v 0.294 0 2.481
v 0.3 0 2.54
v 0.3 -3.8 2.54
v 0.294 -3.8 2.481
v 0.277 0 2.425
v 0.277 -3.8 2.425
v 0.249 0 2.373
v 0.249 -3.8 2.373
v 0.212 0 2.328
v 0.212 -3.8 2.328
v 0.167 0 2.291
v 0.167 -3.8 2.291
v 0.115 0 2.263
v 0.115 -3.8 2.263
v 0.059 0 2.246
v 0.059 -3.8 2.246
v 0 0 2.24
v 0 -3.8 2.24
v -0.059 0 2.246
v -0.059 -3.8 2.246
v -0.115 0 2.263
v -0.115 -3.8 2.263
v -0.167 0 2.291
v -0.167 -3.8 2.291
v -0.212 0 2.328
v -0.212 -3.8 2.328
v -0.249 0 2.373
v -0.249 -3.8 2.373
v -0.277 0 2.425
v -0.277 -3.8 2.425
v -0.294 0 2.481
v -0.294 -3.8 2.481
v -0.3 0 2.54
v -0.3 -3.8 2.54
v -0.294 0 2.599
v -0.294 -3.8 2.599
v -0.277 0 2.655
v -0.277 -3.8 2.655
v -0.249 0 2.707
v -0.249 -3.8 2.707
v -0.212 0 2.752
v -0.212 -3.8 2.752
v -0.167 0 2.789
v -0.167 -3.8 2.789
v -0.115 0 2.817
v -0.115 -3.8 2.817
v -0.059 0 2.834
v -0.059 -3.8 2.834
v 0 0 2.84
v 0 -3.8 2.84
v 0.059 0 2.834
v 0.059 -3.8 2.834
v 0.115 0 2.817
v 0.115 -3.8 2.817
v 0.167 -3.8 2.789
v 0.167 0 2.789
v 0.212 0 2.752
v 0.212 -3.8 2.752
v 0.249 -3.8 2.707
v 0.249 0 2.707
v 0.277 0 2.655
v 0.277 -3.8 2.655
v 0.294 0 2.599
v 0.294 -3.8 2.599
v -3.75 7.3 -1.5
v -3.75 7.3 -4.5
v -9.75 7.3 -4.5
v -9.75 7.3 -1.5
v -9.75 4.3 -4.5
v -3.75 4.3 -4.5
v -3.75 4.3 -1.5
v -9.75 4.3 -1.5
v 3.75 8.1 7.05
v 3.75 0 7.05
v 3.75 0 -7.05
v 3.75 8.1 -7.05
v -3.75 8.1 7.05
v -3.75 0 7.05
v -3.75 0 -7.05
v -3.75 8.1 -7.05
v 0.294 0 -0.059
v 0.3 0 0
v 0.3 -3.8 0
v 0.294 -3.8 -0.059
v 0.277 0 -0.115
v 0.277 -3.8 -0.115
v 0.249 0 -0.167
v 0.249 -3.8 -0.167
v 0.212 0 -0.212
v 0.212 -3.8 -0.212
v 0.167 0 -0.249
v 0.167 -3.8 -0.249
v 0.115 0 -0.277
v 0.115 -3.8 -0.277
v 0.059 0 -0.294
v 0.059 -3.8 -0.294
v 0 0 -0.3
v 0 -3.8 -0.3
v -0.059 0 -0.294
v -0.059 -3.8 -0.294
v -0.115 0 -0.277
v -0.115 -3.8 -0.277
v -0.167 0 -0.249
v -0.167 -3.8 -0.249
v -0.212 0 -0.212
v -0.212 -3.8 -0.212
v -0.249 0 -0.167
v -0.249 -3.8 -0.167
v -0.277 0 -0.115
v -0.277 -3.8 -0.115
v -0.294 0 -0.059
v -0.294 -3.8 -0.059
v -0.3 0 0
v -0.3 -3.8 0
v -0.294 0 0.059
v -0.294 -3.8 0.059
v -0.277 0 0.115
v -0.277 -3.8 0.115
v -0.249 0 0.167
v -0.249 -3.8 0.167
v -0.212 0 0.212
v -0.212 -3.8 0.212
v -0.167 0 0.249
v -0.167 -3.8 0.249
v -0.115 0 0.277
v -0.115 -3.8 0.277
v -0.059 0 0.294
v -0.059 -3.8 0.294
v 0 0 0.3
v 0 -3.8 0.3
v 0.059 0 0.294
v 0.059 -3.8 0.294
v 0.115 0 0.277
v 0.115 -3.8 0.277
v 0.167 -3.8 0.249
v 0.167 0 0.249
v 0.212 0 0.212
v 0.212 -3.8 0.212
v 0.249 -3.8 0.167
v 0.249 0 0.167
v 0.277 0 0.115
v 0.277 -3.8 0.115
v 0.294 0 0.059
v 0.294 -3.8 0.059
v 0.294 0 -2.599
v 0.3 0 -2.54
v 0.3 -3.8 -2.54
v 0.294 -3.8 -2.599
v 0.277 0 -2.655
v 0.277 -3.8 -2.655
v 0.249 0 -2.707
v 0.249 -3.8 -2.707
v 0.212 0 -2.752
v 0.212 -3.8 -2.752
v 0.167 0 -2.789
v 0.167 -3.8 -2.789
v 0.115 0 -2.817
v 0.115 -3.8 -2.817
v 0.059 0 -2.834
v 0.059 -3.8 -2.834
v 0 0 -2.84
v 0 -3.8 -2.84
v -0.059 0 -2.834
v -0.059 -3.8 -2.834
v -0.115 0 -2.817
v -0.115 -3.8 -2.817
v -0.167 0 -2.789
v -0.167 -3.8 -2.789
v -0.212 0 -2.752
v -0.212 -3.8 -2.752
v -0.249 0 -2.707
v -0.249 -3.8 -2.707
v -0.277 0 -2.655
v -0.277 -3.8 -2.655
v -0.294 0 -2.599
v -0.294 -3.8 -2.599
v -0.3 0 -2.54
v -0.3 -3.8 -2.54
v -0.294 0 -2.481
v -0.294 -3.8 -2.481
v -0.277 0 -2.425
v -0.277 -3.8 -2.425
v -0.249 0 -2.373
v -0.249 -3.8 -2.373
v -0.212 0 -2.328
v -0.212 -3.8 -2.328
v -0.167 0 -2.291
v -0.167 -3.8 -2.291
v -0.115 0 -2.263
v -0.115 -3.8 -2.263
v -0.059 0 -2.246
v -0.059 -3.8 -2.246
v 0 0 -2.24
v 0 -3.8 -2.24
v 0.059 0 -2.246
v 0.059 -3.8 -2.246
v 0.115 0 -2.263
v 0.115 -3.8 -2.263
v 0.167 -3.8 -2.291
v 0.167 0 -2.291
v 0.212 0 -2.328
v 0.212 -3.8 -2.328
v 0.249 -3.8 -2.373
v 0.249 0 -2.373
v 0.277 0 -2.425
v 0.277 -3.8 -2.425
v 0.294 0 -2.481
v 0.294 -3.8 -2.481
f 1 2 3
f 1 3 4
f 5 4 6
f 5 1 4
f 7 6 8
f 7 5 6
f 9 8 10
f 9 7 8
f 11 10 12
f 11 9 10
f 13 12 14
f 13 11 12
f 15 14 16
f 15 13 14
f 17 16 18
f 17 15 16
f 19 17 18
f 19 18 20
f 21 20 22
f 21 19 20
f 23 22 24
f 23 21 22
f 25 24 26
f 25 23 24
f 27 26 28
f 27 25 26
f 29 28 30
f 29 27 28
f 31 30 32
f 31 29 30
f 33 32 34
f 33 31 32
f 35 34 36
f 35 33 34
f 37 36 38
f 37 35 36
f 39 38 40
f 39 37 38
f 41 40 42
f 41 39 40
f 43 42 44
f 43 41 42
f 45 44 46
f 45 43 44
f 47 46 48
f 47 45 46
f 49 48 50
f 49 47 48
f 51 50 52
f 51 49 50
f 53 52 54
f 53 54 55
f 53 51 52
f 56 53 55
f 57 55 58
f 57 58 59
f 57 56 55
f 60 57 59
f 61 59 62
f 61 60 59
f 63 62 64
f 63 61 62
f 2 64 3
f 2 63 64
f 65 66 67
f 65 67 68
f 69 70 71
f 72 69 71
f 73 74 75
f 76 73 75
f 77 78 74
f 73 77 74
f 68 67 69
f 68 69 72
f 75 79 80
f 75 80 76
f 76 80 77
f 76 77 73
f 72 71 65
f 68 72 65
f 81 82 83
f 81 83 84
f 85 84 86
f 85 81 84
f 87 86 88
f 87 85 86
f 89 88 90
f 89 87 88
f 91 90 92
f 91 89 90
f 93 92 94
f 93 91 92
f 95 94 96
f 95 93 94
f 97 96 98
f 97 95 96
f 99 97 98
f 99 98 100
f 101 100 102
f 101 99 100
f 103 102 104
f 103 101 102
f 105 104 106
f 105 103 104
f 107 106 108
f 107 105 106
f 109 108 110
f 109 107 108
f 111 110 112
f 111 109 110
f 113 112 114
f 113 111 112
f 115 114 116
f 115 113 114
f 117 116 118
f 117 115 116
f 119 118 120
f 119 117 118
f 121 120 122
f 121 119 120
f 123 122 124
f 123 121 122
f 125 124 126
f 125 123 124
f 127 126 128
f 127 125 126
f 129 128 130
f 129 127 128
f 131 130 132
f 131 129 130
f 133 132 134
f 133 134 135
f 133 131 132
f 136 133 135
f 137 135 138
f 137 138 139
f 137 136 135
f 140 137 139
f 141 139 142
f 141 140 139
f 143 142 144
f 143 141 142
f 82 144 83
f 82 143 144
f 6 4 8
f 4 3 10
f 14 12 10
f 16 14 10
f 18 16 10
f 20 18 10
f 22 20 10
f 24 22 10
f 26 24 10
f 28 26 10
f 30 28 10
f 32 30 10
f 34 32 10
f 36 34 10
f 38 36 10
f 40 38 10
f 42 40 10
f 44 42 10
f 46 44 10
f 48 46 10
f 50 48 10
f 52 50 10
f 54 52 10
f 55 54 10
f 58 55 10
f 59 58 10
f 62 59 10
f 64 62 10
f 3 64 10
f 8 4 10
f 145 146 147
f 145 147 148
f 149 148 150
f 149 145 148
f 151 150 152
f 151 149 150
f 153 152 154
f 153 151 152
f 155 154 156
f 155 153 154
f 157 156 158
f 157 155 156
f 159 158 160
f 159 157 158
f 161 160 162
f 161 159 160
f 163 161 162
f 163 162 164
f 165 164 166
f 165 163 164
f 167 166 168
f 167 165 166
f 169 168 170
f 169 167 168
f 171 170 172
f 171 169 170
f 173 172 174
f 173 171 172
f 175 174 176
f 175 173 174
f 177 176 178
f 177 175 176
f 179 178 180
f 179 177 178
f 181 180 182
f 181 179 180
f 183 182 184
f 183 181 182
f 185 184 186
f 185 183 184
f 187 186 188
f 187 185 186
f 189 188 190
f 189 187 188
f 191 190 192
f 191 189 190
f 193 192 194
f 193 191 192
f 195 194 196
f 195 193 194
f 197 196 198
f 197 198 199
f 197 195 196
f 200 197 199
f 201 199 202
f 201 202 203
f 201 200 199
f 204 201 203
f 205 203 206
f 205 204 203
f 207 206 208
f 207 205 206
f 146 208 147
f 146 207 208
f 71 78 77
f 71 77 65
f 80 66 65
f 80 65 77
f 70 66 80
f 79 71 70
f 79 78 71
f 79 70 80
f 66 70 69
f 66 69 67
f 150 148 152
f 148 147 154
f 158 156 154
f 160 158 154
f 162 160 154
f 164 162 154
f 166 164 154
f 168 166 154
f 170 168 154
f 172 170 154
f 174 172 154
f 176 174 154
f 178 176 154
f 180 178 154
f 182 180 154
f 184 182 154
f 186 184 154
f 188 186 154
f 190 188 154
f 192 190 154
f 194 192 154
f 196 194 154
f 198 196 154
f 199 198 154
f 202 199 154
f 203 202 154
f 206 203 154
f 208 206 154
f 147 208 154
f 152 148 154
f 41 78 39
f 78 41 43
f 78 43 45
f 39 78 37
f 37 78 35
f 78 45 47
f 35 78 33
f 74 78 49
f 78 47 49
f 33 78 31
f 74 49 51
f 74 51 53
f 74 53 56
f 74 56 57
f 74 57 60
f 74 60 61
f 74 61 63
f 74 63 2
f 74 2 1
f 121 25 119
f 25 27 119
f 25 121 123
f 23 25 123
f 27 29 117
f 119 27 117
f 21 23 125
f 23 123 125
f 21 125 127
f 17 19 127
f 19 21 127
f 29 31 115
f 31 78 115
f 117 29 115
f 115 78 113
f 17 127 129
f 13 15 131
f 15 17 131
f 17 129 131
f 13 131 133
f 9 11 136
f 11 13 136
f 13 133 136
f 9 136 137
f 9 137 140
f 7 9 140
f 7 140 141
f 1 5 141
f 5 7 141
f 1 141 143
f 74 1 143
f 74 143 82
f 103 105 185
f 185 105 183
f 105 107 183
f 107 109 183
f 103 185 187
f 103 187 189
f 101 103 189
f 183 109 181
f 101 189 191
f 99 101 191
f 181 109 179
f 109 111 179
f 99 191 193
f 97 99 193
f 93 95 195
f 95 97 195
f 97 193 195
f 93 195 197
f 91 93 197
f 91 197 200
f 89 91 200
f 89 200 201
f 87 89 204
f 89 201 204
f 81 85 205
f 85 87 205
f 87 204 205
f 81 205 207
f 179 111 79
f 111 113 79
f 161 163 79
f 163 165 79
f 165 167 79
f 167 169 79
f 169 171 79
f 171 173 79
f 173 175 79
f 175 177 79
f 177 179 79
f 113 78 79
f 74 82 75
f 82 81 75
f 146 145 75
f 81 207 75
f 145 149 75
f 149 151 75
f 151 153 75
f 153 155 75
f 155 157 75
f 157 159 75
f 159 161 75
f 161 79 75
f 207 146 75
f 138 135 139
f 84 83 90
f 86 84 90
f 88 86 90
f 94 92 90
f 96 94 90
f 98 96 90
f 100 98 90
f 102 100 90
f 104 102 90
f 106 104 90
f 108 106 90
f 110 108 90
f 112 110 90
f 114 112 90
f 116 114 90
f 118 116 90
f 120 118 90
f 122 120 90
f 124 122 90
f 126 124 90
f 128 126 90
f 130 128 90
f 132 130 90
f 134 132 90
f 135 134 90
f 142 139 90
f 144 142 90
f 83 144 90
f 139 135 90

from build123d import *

# Parameters (mm, degrees)
SKETCH1_R             = 0.3
BOSS_EXTRUDE1_DEPTH   = 3.8
BOSS_EXTRUDE1_2_DEPTH = 3.8
BOSS_EXTRUDE1_3_DEPTH = 3.8
SKETCH2_W             = 7.5
SKETCH2_H             = 14.1
BOSS_EXTRUDE2_DEPTH   = 8.1
SKETCH3_W             = 3
SKETCH3_H             = 3
BOSS_EXTRUDE3_DEPTH   = 6


with BuildPart() as part:
    # Sketch1 → Boss-Extrude1 (new body)
    with BuildSketch(Plane(origin=(0, 0, 0), x_dir=(1, 0, 0), z_dir=(0, 1, 0))):
        Circle(SKETCH1_R)
    extrude(amount=-BOSS_EXTRUDE1_DEPTH)



with BuildPart() as body_2:
    # Sketch1 → Boss-Extrude1 2 (new body)
    with BuildSketch(Plane(origin=(0, 0, 0), x_dir=(1, 0, 0), z_dir=(0, 1, 0))):
        with Locations((0, -2.54)):
            Circle(SKETCH1_R)
    extrude(amount=-BOSS_EXTRUDE1_2_DEPTH)


with BuildPart() as body_3:
    # Sketch1 → Boss-Extrude1 3 (new body)
    with BuildSketch(Plane(origin=(0, 0, 0), x_dir=(1, 0, 0), z_dir=(0, 1, 0))):
        with Locations((0, 2.54)):
            Circle(SKETCH1_R)
    extrude(amount=-BOSS_EXTRUDE1_3_DEPTH)


with BuildPart() as part_1:
    add(part.part)

    add(body_2.part)  # Boss-Extrude2 merges body 2

    add(body_3.part)  # Boss-Extrude2 merges body 3
    # Sketch2 → Boss-Extrude2 (add)
    with BuildSketch(Plane(origin=(0, 0, 0), x_dir=(1, 0, 0), z_dir=(0, 1, 0))):
        Rectangle(SKETCH2_W, SKETCH2_H)
    extrude(amount=BOSS_EXTRUDE2_DEPTH)

    # Sketch3 → Boss-Extrude3 (add)
    with BuildSketch(Plane.ZY.offset(3.75)):
        with Locations((-3, 5.8)):
            Rectangle(SKETCH3_W, SKETCH3_H)
    extrude(amount=BOSS_EXTRUDE3_DEPTH)


solid = part_1.part
